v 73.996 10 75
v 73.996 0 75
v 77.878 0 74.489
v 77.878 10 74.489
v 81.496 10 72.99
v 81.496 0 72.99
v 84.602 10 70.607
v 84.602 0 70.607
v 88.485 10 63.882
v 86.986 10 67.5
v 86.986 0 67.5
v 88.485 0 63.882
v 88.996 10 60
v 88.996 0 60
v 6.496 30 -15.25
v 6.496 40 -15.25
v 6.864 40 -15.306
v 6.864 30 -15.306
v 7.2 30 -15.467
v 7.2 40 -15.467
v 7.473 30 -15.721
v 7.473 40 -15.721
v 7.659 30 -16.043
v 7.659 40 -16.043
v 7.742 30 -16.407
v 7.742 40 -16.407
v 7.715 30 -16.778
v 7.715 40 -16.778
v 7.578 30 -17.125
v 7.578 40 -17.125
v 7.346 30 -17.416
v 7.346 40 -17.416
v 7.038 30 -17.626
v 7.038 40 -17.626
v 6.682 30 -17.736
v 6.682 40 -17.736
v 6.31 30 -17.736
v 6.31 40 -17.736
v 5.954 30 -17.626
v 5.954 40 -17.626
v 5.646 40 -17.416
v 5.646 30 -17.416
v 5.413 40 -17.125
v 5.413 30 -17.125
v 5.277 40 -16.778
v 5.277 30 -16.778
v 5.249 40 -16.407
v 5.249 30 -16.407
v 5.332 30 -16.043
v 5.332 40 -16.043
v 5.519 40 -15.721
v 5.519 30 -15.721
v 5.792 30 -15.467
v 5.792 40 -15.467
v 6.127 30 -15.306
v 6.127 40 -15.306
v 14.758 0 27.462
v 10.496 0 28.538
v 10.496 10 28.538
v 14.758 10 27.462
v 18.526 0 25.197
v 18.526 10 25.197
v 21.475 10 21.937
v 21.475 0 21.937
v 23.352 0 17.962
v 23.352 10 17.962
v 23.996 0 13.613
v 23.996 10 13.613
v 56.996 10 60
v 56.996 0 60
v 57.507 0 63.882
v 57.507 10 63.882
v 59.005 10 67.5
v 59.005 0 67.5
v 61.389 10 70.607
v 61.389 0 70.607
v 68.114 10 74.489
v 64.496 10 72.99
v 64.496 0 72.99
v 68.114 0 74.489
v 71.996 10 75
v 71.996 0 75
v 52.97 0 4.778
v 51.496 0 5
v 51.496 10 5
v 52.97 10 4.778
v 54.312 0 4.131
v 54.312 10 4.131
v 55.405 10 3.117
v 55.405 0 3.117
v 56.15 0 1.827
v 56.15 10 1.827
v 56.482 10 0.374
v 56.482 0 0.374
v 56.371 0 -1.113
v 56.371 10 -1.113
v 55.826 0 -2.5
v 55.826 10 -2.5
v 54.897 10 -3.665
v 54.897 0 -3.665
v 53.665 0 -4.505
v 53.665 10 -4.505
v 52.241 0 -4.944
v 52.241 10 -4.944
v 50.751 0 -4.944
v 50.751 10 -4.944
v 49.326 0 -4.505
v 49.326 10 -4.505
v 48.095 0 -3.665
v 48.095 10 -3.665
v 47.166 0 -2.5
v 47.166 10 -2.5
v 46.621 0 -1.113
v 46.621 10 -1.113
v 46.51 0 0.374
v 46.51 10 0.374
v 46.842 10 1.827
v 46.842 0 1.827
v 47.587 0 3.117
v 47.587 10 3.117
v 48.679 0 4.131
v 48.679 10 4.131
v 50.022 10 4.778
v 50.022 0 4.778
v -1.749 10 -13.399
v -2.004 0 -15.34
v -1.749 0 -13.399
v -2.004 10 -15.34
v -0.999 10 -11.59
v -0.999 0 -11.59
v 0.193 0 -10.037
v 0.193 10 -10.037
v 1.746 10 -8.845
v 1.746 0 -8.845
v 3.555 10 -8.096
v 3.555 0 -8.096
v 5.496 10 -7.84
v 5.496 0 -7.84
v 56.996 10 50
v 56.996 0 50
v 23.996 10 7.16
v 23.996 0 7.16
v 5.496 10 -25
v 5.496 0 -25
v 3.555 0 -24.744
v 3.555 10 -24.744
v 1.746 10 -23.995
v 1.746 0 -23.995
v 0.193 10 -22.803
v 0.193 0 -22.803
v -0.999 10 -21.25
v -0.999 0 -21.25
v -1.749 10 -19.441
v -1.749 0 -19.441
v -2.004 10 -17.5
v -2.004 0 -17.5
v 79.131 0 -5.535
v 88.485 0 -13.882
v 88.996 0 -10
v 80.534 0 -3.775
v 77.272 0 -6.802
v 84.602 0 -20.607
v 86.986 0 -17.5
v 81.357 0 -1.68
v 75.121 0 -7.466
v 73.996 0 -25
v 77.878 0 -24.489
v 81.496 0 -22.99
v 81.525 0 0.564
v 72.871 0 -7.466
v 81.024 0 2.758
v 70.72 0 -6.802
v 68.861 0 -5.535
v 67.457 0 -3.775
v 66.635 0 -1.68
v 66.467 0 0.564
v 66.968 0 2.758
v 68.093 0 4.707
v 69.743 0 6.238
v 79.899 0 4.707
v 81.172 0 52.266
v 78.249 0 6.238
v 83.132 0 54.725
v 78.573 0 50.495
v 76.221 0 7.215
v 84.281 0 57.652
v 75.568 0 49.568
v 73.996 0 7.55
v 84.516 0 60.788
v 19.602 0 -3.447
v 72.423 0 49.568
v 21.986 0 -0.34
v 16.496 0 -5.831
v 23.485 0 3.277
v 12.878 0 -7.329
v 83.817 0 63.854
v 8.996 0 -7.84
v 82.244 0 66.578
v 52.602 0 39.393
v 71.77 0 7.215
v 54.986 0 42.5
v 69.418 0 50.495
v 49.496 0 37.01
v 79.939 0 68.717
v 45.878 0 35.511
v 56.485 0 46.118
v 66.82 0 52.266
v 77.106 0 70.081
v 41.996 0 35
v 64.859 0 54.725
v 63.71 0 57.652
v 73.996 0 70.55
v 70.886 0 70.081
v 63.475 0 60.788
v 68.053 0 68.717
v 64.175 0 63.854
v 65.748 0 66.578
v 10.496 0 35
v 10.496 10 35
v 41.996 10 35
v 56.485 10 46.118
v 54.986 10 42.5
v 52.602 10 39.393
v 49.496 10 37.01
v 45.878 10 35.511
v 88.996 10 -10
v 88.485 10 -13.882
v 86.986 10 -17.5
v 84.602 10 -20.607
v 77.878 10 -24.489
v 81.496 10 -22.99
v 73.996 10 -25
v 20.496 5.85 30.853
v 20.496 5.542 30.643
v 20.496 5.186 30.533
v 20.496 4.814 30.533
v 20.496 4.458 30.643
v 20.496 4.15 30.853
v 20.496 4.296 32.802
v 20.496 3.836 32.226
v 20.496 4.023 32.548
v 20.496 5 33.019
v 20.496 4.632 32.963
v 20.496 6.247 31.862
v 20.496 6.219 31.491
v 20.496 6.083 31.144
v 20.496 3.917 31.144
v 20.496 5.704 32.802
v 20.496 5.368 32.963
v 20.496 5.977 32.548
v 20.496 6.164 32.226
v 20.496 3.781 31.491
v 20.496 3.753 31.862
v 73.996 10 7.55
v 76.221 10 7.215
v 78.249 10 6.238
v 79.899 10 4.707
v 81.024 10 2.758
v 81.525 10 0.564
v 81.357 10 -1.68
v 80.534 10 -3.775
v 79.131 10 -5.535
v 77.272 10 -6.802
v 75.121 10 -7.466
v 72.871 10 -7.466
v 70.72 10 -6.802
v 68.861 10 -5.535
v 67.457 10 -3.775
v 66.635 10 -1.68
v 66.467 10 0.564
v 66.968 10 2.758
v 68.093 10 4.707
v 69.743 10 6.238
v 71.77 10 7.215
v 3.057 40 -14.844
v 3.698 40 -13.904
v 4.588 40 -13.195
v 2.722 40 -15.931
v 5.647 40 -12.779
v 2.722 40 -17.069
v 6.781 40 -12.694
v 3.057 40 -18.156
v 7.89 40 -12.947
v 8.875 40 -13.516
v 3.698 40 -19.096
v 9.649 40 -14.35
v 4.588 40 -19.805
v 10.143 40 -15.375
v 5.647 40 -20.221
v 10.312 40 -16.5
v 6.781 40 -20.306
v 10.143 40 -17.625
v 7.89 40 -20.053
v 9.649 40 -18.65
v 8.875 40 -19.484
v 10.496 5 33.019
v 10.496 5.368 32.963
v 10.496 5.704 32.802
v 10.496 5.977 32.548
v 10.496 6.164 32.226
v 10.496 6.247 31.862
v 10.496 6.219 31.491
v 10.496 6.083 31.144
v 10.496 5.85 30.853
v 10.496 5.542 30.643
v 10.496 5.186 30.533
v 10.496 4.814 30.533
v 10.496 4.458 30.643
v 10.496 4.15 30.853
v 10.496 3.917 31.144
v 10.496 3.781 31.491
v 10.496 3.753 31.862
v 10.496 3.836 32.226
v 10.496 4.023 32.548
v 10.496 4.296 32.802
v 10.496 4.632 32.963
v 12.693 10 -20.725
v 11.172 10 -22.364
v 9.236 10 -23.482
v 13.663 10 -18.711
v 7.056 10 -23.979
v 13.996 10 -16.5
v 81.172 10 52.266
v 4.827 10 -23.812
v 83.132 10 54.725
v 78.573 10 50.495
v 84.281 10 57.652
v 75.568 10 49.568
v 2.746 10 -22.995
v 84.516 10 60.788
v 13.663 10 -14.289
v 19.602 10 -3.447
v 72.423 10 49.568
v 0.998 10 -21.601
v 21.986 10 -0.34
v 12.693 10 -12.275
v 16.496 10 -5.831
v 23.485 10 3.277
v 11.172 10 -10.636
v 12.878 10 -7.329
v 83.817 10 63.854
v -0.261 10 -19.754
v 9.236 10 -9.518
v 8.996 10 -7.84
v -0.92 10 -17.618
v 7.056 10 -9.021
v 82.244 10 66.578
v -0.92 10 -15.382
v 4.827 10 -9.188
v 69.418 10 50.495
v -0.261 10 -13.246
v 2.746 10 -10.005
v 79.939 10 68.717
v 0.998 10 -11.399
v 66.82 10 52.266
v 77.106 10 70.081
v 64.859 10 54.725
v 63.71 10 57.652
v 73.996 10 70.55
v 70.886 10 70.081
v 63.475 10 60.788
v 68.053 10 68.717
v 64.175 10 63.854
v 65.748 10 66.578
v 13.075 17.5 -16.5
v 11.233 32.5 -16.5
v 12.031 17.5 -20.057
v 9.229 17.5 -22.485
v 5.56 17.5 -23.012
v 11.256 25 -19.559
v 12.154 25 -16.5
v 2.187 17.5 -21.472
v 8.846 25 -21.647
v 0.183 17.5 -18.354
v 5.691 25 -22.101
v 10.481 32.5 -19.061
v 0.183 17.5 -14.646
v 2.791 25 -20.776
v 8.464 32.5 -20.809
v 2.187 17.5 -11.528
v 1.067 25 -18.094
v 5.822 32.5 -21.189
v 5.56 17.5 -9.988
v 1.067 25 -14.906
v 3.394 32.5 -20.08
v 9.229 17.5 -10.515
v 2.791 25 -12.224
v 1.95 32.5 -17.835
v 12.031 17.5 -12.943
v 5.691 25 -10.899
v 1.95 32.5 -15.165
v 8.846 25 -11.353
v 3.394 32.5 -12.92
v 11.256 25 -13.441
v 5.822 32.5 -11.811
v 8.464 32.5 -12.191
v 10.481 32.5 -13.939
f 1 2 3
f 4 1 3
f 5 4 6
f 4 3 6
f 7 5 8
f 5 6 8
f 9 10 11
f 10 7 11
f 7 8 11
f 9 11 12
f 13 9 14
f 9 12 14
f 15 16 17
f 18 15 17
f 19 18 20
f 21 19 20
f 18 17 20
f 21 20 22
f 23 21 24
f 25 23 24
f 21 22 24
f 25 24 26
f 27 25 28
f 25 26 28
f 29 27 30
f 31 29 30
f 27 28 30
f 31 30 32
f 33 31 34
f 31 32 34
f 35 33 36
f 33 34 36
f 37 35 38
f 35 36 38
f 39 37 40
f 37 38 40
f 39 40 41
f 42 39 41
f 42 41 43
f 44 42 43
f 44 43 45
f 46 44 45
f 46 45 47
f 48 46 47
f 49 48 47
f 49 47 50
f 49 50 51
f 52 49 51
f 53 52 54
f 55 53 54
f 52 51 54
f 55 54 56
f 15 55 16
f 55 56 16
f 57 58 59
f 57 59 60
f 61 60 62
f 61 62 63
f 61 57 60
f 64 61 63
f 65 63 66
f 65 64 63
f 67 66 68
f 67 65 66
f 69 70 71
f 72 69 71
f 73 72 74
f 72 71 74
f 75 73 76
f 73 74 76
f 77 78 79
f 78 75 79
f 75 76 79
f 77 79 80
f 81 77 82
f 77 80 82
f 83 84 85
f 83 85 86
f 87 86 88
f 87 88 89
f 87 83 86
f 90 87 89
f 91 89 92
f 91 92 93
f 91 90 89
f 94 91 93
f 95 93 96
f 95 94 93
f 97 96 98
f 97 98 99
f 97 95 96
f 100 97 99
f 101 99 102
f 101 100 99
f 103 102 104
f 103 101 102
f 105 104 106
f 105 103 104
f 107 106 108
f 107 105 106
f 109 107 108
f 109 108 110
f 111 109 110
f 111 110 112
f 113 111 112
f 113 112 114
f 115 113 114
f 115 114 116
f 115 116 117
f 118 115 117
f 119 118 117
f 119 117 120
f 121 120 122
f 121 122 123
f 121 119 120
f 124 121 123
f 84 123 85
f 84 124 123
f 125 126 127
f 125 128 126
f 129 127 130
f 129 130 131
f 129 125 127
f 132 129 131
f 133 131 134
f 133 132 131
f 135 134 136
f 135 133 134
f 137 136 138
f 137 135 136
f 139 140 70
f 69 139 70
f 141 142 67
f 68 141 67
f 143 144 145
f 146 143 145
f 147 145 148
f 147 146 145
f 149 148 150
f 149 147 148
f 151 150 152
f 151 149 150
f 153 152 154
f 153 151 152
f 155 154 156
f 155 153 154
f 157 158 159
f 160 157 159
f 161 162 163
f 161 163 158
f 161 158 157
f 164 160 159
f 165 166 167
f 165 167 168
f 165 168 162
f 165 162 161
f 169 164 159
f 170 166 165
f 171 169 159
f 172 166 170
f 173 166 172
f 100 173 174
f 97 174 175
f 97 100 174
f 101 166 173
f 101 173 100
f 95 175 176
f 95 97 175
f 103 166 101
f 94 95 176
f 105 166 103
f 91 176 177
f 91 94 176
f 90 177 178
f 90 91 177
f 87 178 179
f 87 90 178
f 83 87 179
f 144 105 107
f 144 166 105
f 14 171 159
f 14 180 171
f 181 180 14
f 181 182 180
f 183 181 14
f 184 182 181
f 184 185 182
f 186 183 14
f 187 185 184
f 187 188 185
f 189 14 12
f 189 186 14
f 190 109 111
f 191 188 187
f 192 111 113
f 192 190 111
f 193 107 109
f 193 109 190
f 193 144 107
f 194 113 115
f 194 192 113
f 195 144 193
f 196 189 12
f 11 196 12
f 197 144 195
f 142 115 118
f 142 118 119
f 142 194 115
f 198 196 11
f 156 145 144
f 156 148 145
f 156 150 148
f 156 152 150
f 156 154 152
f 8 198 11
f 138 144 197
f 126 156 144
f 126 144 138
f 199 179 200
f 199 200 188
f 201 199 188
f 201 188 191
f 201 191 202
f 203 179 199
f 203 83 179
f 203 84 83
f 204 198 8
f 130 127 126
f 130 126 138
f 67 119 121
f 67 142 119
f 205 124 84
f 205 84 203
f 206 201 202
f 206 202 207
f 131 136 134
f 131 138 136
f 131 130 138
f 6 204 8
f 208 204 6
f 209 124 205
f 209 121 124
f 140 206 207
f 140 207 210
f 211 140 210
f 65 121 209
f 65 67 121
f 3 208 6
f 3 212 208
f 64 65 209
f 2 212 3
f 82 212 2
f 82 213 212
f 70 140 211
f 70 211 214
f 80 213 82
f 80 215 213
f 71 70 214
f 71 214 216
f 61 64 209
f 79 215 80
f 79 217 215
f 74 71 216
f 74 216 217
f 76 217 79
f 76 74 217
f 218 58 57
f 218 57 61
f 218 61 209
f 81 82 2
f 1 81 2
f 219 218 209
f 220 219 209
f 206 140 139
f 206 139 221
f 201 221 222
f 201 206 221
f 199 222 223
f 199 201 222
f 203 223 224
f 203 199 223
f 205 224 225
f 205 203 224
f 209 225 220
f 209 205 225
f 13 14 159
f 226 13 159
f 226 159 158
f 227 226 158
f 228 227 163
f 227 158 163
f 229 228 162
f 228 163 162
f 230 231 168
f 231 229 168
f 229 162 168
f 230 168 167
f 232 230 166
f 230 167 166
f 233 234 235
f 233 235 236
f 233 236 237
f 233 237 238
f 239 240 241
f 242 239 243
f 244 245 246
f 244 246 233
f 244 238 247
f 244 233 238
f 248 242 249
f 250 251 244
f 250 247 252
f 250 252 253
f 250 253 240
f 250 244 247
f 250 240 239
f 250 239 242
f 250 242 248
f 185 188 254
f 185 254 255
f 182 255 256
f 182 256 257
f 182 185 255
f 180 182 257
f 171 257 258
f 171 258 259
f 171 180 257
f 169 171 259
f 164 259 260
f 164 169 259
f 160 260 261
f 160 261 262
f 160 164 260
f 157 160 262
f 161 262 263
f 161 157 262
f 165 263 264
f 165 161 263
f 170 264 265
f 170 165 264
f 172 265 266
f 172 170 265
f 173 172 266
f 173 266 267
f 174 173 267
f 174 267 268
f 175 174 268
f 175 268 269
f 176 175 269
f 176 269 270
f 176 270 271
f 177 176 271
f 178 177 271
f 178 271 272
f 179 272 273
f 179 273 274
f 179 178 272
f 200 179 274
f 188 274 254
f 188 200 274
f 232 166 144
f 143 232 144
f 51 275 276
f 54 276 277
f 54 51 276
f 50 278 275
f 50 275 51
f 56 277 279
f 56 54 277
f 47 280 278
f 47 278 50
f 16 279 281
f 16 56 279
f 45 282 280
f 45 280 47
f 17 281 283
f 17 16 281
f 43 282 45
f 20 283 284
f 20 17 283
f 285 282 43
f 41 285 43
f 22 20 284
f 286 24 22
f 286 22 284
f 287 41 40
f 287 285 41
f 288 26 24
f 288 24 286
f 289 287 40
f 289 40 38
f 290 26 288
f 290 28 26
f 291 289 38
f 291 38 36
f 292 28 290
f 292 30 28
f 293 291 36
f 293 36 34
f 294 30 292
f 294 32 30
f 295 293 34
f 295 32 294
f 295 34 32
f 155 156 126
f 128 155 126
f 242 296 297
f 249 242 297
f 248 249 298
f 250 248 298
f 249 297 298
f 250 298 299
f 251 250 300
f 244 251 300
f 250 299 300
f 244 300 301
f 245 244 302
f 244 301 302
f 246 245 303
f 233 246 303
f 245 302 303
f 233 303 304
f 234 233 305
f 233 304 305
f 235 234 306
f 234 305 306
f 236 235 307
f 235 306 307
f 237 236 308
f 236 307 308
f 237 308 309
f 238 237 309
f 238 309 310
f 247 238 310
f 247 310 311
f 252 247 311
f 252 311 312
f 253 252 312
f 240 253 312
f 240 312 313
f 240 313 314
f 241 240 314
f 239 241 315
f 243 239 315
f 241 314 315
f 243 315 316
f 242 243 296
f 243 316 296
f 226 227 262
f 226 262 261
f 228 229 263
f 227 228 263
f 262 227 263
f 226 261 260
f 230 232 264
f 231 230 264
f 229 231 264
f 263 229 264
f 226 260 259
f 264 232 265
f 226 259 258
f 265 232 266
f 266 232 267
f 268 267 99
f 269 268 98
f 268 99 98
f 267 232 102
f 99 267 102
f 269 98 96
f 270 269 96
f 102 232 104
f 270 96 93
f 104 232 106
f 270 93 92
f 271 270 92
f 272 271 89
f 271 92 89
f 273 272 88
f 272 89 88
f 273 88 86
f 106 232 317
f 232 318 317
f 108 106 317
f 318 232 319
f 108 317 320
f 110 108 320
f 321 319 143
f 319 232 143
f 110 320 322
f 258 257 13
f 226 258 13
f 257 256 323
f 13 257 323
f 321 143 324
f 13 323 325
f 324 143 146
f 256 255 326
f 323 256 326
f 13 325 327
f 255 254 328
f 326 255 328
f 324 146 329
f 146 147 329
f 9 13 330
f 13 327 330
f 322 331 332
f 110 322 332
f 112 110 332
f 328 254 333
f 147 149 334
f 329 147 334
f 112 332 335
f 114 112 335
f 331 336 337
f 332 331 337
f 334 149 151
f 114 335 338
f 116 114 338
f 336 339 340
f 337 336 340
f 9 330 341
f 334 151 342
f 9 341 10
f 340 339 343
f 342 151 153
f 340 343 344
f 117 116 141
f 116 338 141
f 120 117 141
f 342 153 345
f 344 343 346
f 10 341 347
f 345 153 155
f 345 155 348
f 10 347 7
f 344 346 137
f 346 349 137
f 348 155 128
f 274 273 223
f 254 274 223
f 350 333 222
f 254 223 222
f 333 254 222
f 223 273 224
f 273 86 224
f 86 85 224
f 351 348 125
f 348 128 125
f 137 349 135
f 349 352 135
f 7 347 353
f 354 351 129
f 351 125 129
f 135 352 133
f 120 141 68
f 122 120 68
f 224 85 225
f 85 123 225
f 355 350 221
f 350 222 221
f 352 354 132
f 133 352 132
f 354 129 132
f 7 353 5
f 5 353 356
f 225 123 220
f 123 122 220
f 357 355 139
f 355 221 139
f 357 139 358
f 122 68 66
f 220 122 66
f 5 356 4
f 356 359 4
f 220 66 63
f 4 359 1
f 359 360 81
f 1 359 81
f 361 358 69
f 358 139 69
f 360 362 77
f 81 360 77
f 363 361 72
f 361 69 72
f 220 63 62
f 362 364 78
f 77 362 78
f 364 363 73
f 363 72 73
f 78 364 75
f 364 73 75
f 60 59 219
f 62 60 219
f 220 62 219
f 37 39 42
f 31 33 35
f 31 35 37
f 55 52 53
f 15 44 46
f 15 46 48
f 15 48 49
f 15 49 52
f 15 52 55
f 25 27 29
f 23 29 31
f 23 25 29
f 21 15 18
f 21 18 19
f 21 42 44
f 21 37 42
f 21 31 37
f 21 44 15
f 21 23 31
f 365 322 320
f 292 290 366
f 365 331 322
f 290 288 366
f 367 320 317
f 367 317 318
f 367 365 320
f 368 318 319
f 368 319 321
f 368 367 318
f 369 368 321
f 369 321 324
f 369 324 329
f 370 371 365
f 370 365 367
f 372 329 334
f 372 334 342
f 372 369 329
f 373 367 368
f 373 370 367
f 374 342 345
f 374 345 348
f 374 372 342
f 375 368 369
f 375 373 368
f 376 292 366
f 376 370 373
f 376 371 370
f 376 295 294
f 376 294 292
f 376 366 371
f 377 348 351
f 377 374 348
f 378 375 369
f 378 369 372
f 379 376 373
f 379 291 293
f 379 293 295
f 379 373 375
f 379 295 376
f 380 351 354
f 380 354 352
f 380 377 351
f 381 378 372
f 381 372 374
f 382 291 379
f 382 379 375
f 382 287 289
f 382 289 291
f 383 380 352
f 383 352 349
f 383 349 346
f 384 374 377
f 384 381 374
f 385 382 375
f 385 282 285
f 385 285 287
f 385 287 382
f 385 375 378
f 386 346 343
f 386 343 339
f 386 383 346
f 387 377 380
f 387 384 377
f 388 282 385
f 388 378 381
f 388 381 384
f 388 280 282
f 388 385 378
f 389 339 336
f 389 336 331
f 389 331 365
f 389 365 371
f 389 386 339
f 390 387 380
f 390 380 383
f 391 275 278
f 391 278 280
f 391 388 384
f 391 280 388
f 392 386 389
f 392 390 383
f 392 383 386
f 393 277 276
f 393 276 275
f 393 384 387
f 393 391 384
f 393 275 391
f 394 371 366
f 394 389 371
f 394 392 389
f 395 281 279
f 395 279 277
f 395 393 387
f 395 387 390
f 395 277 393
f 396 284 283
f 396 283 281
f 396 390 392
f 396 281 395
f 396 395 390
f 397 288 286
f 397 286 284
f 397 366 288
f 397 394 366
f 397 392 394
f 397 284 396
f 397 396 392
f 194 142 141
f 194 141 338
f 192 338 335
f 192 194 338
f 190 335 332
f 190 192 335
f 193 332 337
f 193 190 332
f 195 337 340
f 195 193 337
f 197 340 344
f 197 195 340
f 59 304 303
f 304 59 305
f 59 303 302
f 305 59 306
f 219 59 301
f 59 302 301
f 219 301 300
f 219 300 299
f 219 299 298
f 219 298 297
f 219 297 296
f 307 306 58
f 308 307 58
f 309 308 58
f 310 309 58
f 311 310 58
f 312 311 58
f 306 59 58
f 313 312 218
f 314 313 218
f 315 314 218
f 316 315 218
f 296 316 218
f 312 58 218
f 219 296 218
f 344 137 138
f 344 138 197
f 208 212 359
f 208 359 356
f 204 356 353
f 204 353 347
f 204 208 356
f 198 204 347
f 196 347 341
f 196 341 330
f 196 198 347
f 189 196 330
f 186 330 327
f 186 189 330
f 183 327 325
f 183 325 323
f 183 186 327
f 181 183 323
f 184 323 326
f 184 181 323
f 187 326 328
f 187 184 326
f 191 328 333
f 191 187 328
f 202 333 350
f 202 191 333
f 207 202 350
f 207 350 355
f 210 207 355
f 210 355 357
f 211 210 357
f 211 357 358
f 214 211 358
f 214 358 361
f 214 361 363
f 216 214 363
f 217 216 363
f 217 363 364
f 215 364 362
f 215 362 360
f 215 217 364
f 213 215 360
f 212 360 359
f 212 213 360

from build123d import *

# Parameters (mm, degrees)
SKETCH1_R           = 7.55
SKETCH1_R_2         = 5
SKETCH1_R_3         = 10.55
BOSS_EXTRUDE1_DEPTH = 10
SKETCH2_R           = 1.25
CUT_EXTRUDE1_DEPTH  = 10
SKETCH4_R           = 7.5
BOSS_EXTRUDE2_DEPTH = 30
BOSS_EXTRUDE2_TAPER = 7
SKETCH5_R           = 1.25
CUT_EXTRUDE2_DEPTH  = 10
FILLET1_R           = 15
FILLET2_R           = 7.5


with BuildPart() as part:
    # Sketch1 → Boss-Extrude1 (new body)
    with BuildSketch(Plane(origin=(0, 0, 0), x_dir=(1, 0, 0), z_dir=(0, 1, 0))):
        Polygon((23.995878661, -35), (56.995878661, -35), (56.995878661, -75), (88.995878661, -75), (88.995878661, -25), (88.995878661, 25), (17.5, 25), (-2.004121339, 25), (-2.004121339, 7.840472806), (23.995878661, 7.840472806), (23.995878661, 0), (23.995878661, -28.53803828), (10.495878661, -28.53803828), (10.495878661, -35), align=None)
        with Locations(Location((73.995878661, 0, 0), (0, 0, 270))):
            Circle(SKETCH1_R, mode=Mode.SUBTRACT)
        with Locations(Location((51.495878661, 0, 0), (0, 0, 270))):
            Circle(SKETCH1_R_2, mode=Mode.SUBTRACT)
        with Locations(Location((73.995878661, -60, 0), (0, 0, 270))):
            Circle(SKETCH1_R_3, mode=Mode.SUBTRACT)
    extrude(amount=BOSS_EXTRUDE1_DEPTH)

    # Sketch2 → Cut-Extrude1 (cut)
    with BuildSketch(Plane.ZY.offset(-10.495878661)):
        with Locations((31.76901914, 5)):
            Circle(SKETCH2_R)
    extrude(amount=-CUT_EXTRUDE1_DEPTH, mode=Mode.SUBTRACT)

    # Sketch4 → Boss-Extrude2 (add)
    with BuildSketch(Plane(origin=(0, 10, 0), x_dir=(1, 0, 0), z_dir=(0, 1, 0))):
        with Locations((6.495878661, 16.5)):
            Circle(SKETCH4_R)
    extrude(amount=BOSS_EXTRUDE2_DEPTH, taper=BOSS_EXTRUDE2_TAPER)

    # Sketch5 → Cut-Extrude2 (cut)
    with BuildSketch(Plane(origin=(0, 40, 0), x_dir=(1, 0, 0), z_dir=(0, 1, 0))):
        with Locations(Location((6.495878661, 16.5, 0), (0, 0, 270))):
            Circle(SKETCH5_R)
    extrude(amount=-CUT_EXTRUDE2_DEPTH, mode=Mode.SUBTRACT)

    # Fillet1
    # the kernel refuses this fillet: 15 mm, written as the material it adds along each edge
    with BuildSketch(Plane(origin=(56.995878661, 0, 35), x_dir=(-1, 0, 0), z_dir=(0, 1, 0)), Plane(origin=(23.995878661, 0, -7.840472806), x_dir=(-1, 0, 0), z_dir=(0, 1, 0))) as fillet1_piece_1:
        with BuildLine():
            CenterArc((FILLET1_R, FILLET1_R), FILLET1_R, 180, 90)
            Line((0, FILLET1_R), (0, 0))
            Line((0, 0), (FILLET1_R, 0))
        make_face()
    extrude(amount=10)
    with BuildSketch(Plane(origin=(23.995878661, 0, 28.53803828), x_dir=(0, 0, -1), z_dir=(0, 1, 0))) as fillet1_piece_2:
        with BuildLine():
            CenterArc((14.924811557, 15), FILLET1_R, 185.739170477, 84.260829523)
            Line((0, 13.5), (0, 0))
            Line((0, 0), (14.924811557, 0))
        make_face()
    extrude(amount=10)
    # the kernel refuses this fillet: 15 mm, written as the material it takes off along each edge
    with BuildSketch(Plane(origin=(88.995878661, -37.5, -25), x_dir=(0, 0, 1), z_dir=(0, 1, 0)), Plane(origin=(88.995878661, -37.5, 75), x_dir=(-1, 0, 0), z_dir=(0, 1, 0)), Plane(origin=(56.995878661, -37.5, 75), x_dir=(0, 0, -1), z_dir=(0, 1, 0))) as fillet1_2_piece_1:
        with BuildLine():
            CenterArc((FILLET1_R, -FILLET1_R), FILLET1_R, 90, 90)
            Line((0, -FILLET1_R), (0, 0))
            Line((0, 0), (FILLET1_R, 0))
        make_face()
    extrude(amount=85, mode=Mode.SUBTRACT)

    # Fillet2
    fillet2_edges = [part.edges().sort_by_distance(p)[0] for p in [
        (-2.004121339, 5, -7.840472806),
        (-2.004121339, 5, -25),
    ]]
    fillet(fillet2_edges, radius=FILLET2_R)


solid = part.part
